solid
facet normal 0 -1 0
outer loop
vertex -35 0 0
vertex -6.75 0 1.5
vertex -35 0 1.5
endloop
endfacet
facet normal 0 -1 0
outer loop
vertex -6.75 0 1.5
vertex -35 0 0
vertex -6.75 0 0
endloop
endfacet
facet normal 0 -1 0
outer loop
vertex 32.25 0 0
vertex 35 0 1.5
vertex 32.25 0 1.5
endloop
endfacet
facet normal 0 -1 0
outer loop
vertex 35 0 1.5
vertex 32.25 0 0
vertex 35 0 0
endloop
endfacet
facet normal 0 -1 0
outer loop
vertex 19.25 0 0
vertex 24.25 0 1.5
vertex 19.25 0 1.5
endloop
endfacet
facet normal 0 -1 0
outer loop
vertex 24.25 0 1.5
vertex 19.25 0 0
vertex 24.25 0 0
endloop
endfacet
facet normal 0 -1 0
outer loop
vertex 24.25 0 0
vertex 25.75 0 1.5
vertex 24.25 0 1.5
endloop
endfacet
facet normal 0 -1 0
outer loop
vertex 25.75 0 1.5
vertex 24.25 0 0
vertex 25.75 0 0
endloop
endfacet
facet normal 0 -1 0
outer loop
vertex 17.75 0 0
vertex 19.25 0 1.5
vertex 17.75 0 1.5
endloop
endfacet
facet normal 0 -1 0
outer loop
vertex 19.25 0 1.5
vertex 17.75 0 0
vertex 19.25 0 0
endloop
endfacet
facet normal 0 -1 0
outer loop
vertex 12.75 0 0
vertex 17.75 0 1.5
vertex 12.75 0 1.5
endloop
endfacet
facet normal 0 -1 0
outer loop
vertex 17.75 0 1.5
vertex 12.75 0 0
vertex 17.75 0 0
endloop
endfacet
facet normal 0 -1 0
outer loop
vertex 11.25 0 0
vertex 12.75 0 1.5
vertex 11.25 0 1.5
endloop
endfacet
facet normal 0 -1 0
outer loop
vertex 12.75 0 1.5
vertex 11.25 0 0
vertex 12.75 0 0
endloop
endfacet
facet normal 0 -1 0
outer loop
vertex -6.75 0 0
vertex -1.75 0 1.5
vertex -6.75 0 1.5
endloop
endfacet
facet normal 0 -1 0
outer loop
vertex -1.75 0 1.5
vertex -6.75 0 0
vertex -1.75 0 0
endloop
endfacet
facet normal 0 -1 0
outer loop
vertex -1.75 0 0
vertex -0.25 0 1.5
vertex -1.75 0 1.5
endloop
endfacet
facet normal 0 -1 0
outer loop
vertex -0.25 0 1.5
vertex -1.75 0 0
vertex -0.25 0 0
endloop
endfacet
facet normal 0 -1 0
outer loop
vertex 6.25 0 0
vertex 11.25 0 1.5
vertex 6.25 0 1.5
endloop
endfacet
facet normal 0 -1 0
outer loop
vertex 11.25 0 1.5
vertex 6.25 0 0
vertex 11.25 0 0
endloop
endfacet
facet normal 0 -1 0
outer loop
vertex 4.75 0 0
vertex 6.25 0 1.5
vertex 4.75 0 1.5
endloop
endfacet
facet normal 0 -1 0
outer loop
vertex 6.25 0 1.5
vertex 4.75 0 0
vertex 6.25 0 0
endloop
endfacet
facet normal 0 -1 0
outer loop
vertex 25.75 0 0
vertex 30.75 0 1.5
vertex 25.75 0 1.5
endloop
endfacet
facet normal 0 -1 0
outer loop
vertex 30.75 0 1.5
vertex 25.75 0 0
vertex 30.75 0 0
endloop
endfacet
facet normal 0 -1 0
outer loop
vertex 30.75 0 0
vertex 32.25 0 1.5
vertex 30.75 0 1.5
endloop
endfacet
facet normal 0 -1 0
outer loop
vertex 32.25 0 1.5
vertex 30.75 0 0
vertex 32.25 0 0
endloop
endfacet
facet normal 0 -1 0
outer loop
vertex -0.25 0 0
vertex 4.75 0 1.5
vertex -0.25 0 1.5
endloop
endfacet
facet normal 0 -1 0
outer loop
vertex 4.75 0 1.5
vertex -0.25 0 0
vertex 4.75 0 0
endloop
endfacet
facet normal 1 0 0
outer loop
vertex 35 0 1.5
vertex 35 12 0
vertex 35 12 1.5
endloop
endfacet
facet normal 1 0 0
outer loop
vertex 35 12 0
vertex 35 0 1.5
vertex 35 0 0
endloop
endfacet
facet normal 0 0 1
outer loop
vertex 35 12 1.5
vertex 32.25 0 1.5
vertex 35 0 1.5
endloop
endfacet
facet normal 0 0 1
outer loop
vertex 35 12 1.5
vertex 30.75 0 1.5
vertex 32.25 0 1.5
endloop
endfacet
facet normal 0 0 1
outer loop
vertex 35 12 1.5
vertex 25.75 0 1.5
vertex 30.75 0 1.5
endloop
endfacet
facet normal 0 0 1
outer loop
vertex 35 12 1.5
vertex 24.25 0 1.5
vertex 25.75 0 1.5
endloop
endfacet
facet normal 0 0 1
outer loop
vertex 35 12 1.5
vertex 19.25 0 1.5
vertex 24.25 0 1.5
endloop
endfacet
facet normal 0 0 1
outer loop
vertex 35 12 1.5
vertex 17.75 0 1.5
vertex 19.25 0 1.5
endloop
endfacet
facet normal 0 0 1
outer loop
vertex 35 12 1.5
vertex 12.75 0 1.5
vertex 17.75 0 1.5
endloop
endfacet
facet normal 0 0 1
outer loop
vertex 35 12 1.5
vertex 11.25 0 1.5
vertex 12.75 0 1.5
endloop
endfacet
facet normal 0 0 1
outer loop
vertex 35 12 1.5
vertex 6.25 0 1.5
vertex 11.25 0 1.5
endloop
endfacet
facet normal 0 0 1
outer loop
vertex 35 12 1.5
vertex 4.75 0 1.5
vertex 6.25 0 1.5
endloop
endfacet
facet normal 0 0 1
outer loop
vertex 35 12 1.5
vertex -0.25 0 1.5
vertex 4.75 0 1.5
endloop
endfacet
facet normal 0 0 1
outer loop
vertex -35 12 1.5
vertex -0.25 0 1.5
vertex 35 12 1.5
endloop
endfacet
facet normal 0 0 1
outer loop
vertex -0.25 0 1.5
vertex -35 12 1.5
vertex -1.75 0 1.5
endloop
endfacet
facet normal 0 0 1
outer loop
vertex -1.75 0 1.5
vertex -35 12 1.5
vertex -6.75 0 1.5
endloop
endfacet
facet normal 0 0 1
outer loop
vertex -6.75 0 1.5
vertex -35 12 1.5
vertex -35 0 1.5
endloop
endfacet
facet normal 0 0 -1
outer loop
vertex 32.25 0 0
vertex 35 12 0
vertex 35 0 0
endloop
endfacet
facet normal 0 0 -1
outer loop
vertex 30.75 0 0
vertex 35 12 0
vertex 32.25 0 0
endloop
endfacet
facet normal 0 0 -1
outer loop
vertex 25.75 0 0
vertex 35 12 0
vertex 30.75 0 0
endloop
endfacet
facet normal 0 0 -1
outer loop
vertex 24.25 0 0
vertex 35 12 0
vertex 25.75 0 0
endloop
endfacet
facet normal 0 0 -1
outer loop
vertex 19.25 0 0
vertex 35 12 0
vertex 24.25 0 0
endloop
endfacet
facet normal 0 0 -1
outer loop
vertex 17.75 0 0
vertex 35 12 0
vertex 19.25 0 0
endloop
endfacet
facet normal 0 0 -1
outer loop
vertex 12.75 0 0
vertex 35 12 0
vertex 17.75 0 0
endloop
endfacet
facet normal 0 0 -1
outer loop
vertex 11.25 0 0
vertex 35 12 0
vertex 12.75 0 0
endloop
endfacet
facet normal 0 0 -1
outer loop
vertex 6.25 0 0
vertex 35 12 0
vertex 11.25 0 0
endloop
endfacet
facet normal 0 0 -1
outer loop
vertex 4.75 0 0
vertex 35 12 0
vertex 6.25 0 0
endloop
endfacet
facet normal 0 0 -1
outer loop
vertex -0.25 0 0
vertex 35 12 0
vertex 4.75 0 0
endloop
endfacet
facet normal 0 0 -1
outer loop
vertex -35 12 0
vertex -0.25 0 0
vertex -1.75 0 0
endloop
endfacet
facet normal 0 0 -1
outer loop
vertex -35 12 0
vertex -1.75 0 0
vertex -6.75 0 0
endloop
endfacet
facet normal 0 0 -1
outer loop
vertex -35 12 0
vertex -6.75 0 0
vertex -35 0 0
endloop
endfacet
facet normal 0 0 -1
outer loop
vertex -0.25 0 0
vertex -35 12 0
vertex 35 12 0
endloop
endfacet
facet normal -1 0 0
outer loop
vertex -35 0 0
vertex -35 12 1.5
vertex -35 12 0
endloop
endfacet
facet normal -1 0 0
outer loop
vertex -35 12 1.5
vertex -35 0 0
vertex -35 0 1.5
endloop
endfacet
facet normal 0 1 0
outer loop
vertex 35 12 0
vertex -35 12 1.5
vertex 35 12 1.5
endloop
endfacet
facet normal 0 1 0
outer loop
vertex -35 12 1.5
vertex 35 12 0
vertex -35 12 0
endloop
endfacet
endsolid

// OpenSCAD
// 10-well comb for agarose gel casting, printed lying flat
// Units: mm

// ---- Spine ----
spine_len   = 70;    // spine length (X)
spine_wid   = 12;    // spine width (Y)

// ---- Teeth ----
n_teeth     = 10;    // number of teeth
tooth_w     = 5.0;   // tooth width (X)
tooth_len   = 12;    // tooth length (Y)
tooth_gap   = 1.5;   // gap between teeth (X)

// ---- Plate ----
plate_t     = 1.5;   // plate thickness (Z)

// ---- Misc ----
eps         = 0.5;   // cutter overshoot past faces
$fn         = 64;

// Derived
pitch       = tooth_w + tooth_gap;   // centre-to-centre spacing
row_span    = (n_teeth - 1) * tooth_gap; // total gap width
x_start     = -(row_span / 2);         // first tooth centre offset

difference() {
    // Spine
    translate([-spine_len / 2, 0, 0])
        cube([spine_len, spine_wid, plate_t]);

    // Teeth
    for (i = [0 : n_teeth - 1]) {
        translate([x_start + i * pitch, -tooth_len, 0])
            cube([tooth_w, tooth_len, plate_t + eps]);
    }
}
